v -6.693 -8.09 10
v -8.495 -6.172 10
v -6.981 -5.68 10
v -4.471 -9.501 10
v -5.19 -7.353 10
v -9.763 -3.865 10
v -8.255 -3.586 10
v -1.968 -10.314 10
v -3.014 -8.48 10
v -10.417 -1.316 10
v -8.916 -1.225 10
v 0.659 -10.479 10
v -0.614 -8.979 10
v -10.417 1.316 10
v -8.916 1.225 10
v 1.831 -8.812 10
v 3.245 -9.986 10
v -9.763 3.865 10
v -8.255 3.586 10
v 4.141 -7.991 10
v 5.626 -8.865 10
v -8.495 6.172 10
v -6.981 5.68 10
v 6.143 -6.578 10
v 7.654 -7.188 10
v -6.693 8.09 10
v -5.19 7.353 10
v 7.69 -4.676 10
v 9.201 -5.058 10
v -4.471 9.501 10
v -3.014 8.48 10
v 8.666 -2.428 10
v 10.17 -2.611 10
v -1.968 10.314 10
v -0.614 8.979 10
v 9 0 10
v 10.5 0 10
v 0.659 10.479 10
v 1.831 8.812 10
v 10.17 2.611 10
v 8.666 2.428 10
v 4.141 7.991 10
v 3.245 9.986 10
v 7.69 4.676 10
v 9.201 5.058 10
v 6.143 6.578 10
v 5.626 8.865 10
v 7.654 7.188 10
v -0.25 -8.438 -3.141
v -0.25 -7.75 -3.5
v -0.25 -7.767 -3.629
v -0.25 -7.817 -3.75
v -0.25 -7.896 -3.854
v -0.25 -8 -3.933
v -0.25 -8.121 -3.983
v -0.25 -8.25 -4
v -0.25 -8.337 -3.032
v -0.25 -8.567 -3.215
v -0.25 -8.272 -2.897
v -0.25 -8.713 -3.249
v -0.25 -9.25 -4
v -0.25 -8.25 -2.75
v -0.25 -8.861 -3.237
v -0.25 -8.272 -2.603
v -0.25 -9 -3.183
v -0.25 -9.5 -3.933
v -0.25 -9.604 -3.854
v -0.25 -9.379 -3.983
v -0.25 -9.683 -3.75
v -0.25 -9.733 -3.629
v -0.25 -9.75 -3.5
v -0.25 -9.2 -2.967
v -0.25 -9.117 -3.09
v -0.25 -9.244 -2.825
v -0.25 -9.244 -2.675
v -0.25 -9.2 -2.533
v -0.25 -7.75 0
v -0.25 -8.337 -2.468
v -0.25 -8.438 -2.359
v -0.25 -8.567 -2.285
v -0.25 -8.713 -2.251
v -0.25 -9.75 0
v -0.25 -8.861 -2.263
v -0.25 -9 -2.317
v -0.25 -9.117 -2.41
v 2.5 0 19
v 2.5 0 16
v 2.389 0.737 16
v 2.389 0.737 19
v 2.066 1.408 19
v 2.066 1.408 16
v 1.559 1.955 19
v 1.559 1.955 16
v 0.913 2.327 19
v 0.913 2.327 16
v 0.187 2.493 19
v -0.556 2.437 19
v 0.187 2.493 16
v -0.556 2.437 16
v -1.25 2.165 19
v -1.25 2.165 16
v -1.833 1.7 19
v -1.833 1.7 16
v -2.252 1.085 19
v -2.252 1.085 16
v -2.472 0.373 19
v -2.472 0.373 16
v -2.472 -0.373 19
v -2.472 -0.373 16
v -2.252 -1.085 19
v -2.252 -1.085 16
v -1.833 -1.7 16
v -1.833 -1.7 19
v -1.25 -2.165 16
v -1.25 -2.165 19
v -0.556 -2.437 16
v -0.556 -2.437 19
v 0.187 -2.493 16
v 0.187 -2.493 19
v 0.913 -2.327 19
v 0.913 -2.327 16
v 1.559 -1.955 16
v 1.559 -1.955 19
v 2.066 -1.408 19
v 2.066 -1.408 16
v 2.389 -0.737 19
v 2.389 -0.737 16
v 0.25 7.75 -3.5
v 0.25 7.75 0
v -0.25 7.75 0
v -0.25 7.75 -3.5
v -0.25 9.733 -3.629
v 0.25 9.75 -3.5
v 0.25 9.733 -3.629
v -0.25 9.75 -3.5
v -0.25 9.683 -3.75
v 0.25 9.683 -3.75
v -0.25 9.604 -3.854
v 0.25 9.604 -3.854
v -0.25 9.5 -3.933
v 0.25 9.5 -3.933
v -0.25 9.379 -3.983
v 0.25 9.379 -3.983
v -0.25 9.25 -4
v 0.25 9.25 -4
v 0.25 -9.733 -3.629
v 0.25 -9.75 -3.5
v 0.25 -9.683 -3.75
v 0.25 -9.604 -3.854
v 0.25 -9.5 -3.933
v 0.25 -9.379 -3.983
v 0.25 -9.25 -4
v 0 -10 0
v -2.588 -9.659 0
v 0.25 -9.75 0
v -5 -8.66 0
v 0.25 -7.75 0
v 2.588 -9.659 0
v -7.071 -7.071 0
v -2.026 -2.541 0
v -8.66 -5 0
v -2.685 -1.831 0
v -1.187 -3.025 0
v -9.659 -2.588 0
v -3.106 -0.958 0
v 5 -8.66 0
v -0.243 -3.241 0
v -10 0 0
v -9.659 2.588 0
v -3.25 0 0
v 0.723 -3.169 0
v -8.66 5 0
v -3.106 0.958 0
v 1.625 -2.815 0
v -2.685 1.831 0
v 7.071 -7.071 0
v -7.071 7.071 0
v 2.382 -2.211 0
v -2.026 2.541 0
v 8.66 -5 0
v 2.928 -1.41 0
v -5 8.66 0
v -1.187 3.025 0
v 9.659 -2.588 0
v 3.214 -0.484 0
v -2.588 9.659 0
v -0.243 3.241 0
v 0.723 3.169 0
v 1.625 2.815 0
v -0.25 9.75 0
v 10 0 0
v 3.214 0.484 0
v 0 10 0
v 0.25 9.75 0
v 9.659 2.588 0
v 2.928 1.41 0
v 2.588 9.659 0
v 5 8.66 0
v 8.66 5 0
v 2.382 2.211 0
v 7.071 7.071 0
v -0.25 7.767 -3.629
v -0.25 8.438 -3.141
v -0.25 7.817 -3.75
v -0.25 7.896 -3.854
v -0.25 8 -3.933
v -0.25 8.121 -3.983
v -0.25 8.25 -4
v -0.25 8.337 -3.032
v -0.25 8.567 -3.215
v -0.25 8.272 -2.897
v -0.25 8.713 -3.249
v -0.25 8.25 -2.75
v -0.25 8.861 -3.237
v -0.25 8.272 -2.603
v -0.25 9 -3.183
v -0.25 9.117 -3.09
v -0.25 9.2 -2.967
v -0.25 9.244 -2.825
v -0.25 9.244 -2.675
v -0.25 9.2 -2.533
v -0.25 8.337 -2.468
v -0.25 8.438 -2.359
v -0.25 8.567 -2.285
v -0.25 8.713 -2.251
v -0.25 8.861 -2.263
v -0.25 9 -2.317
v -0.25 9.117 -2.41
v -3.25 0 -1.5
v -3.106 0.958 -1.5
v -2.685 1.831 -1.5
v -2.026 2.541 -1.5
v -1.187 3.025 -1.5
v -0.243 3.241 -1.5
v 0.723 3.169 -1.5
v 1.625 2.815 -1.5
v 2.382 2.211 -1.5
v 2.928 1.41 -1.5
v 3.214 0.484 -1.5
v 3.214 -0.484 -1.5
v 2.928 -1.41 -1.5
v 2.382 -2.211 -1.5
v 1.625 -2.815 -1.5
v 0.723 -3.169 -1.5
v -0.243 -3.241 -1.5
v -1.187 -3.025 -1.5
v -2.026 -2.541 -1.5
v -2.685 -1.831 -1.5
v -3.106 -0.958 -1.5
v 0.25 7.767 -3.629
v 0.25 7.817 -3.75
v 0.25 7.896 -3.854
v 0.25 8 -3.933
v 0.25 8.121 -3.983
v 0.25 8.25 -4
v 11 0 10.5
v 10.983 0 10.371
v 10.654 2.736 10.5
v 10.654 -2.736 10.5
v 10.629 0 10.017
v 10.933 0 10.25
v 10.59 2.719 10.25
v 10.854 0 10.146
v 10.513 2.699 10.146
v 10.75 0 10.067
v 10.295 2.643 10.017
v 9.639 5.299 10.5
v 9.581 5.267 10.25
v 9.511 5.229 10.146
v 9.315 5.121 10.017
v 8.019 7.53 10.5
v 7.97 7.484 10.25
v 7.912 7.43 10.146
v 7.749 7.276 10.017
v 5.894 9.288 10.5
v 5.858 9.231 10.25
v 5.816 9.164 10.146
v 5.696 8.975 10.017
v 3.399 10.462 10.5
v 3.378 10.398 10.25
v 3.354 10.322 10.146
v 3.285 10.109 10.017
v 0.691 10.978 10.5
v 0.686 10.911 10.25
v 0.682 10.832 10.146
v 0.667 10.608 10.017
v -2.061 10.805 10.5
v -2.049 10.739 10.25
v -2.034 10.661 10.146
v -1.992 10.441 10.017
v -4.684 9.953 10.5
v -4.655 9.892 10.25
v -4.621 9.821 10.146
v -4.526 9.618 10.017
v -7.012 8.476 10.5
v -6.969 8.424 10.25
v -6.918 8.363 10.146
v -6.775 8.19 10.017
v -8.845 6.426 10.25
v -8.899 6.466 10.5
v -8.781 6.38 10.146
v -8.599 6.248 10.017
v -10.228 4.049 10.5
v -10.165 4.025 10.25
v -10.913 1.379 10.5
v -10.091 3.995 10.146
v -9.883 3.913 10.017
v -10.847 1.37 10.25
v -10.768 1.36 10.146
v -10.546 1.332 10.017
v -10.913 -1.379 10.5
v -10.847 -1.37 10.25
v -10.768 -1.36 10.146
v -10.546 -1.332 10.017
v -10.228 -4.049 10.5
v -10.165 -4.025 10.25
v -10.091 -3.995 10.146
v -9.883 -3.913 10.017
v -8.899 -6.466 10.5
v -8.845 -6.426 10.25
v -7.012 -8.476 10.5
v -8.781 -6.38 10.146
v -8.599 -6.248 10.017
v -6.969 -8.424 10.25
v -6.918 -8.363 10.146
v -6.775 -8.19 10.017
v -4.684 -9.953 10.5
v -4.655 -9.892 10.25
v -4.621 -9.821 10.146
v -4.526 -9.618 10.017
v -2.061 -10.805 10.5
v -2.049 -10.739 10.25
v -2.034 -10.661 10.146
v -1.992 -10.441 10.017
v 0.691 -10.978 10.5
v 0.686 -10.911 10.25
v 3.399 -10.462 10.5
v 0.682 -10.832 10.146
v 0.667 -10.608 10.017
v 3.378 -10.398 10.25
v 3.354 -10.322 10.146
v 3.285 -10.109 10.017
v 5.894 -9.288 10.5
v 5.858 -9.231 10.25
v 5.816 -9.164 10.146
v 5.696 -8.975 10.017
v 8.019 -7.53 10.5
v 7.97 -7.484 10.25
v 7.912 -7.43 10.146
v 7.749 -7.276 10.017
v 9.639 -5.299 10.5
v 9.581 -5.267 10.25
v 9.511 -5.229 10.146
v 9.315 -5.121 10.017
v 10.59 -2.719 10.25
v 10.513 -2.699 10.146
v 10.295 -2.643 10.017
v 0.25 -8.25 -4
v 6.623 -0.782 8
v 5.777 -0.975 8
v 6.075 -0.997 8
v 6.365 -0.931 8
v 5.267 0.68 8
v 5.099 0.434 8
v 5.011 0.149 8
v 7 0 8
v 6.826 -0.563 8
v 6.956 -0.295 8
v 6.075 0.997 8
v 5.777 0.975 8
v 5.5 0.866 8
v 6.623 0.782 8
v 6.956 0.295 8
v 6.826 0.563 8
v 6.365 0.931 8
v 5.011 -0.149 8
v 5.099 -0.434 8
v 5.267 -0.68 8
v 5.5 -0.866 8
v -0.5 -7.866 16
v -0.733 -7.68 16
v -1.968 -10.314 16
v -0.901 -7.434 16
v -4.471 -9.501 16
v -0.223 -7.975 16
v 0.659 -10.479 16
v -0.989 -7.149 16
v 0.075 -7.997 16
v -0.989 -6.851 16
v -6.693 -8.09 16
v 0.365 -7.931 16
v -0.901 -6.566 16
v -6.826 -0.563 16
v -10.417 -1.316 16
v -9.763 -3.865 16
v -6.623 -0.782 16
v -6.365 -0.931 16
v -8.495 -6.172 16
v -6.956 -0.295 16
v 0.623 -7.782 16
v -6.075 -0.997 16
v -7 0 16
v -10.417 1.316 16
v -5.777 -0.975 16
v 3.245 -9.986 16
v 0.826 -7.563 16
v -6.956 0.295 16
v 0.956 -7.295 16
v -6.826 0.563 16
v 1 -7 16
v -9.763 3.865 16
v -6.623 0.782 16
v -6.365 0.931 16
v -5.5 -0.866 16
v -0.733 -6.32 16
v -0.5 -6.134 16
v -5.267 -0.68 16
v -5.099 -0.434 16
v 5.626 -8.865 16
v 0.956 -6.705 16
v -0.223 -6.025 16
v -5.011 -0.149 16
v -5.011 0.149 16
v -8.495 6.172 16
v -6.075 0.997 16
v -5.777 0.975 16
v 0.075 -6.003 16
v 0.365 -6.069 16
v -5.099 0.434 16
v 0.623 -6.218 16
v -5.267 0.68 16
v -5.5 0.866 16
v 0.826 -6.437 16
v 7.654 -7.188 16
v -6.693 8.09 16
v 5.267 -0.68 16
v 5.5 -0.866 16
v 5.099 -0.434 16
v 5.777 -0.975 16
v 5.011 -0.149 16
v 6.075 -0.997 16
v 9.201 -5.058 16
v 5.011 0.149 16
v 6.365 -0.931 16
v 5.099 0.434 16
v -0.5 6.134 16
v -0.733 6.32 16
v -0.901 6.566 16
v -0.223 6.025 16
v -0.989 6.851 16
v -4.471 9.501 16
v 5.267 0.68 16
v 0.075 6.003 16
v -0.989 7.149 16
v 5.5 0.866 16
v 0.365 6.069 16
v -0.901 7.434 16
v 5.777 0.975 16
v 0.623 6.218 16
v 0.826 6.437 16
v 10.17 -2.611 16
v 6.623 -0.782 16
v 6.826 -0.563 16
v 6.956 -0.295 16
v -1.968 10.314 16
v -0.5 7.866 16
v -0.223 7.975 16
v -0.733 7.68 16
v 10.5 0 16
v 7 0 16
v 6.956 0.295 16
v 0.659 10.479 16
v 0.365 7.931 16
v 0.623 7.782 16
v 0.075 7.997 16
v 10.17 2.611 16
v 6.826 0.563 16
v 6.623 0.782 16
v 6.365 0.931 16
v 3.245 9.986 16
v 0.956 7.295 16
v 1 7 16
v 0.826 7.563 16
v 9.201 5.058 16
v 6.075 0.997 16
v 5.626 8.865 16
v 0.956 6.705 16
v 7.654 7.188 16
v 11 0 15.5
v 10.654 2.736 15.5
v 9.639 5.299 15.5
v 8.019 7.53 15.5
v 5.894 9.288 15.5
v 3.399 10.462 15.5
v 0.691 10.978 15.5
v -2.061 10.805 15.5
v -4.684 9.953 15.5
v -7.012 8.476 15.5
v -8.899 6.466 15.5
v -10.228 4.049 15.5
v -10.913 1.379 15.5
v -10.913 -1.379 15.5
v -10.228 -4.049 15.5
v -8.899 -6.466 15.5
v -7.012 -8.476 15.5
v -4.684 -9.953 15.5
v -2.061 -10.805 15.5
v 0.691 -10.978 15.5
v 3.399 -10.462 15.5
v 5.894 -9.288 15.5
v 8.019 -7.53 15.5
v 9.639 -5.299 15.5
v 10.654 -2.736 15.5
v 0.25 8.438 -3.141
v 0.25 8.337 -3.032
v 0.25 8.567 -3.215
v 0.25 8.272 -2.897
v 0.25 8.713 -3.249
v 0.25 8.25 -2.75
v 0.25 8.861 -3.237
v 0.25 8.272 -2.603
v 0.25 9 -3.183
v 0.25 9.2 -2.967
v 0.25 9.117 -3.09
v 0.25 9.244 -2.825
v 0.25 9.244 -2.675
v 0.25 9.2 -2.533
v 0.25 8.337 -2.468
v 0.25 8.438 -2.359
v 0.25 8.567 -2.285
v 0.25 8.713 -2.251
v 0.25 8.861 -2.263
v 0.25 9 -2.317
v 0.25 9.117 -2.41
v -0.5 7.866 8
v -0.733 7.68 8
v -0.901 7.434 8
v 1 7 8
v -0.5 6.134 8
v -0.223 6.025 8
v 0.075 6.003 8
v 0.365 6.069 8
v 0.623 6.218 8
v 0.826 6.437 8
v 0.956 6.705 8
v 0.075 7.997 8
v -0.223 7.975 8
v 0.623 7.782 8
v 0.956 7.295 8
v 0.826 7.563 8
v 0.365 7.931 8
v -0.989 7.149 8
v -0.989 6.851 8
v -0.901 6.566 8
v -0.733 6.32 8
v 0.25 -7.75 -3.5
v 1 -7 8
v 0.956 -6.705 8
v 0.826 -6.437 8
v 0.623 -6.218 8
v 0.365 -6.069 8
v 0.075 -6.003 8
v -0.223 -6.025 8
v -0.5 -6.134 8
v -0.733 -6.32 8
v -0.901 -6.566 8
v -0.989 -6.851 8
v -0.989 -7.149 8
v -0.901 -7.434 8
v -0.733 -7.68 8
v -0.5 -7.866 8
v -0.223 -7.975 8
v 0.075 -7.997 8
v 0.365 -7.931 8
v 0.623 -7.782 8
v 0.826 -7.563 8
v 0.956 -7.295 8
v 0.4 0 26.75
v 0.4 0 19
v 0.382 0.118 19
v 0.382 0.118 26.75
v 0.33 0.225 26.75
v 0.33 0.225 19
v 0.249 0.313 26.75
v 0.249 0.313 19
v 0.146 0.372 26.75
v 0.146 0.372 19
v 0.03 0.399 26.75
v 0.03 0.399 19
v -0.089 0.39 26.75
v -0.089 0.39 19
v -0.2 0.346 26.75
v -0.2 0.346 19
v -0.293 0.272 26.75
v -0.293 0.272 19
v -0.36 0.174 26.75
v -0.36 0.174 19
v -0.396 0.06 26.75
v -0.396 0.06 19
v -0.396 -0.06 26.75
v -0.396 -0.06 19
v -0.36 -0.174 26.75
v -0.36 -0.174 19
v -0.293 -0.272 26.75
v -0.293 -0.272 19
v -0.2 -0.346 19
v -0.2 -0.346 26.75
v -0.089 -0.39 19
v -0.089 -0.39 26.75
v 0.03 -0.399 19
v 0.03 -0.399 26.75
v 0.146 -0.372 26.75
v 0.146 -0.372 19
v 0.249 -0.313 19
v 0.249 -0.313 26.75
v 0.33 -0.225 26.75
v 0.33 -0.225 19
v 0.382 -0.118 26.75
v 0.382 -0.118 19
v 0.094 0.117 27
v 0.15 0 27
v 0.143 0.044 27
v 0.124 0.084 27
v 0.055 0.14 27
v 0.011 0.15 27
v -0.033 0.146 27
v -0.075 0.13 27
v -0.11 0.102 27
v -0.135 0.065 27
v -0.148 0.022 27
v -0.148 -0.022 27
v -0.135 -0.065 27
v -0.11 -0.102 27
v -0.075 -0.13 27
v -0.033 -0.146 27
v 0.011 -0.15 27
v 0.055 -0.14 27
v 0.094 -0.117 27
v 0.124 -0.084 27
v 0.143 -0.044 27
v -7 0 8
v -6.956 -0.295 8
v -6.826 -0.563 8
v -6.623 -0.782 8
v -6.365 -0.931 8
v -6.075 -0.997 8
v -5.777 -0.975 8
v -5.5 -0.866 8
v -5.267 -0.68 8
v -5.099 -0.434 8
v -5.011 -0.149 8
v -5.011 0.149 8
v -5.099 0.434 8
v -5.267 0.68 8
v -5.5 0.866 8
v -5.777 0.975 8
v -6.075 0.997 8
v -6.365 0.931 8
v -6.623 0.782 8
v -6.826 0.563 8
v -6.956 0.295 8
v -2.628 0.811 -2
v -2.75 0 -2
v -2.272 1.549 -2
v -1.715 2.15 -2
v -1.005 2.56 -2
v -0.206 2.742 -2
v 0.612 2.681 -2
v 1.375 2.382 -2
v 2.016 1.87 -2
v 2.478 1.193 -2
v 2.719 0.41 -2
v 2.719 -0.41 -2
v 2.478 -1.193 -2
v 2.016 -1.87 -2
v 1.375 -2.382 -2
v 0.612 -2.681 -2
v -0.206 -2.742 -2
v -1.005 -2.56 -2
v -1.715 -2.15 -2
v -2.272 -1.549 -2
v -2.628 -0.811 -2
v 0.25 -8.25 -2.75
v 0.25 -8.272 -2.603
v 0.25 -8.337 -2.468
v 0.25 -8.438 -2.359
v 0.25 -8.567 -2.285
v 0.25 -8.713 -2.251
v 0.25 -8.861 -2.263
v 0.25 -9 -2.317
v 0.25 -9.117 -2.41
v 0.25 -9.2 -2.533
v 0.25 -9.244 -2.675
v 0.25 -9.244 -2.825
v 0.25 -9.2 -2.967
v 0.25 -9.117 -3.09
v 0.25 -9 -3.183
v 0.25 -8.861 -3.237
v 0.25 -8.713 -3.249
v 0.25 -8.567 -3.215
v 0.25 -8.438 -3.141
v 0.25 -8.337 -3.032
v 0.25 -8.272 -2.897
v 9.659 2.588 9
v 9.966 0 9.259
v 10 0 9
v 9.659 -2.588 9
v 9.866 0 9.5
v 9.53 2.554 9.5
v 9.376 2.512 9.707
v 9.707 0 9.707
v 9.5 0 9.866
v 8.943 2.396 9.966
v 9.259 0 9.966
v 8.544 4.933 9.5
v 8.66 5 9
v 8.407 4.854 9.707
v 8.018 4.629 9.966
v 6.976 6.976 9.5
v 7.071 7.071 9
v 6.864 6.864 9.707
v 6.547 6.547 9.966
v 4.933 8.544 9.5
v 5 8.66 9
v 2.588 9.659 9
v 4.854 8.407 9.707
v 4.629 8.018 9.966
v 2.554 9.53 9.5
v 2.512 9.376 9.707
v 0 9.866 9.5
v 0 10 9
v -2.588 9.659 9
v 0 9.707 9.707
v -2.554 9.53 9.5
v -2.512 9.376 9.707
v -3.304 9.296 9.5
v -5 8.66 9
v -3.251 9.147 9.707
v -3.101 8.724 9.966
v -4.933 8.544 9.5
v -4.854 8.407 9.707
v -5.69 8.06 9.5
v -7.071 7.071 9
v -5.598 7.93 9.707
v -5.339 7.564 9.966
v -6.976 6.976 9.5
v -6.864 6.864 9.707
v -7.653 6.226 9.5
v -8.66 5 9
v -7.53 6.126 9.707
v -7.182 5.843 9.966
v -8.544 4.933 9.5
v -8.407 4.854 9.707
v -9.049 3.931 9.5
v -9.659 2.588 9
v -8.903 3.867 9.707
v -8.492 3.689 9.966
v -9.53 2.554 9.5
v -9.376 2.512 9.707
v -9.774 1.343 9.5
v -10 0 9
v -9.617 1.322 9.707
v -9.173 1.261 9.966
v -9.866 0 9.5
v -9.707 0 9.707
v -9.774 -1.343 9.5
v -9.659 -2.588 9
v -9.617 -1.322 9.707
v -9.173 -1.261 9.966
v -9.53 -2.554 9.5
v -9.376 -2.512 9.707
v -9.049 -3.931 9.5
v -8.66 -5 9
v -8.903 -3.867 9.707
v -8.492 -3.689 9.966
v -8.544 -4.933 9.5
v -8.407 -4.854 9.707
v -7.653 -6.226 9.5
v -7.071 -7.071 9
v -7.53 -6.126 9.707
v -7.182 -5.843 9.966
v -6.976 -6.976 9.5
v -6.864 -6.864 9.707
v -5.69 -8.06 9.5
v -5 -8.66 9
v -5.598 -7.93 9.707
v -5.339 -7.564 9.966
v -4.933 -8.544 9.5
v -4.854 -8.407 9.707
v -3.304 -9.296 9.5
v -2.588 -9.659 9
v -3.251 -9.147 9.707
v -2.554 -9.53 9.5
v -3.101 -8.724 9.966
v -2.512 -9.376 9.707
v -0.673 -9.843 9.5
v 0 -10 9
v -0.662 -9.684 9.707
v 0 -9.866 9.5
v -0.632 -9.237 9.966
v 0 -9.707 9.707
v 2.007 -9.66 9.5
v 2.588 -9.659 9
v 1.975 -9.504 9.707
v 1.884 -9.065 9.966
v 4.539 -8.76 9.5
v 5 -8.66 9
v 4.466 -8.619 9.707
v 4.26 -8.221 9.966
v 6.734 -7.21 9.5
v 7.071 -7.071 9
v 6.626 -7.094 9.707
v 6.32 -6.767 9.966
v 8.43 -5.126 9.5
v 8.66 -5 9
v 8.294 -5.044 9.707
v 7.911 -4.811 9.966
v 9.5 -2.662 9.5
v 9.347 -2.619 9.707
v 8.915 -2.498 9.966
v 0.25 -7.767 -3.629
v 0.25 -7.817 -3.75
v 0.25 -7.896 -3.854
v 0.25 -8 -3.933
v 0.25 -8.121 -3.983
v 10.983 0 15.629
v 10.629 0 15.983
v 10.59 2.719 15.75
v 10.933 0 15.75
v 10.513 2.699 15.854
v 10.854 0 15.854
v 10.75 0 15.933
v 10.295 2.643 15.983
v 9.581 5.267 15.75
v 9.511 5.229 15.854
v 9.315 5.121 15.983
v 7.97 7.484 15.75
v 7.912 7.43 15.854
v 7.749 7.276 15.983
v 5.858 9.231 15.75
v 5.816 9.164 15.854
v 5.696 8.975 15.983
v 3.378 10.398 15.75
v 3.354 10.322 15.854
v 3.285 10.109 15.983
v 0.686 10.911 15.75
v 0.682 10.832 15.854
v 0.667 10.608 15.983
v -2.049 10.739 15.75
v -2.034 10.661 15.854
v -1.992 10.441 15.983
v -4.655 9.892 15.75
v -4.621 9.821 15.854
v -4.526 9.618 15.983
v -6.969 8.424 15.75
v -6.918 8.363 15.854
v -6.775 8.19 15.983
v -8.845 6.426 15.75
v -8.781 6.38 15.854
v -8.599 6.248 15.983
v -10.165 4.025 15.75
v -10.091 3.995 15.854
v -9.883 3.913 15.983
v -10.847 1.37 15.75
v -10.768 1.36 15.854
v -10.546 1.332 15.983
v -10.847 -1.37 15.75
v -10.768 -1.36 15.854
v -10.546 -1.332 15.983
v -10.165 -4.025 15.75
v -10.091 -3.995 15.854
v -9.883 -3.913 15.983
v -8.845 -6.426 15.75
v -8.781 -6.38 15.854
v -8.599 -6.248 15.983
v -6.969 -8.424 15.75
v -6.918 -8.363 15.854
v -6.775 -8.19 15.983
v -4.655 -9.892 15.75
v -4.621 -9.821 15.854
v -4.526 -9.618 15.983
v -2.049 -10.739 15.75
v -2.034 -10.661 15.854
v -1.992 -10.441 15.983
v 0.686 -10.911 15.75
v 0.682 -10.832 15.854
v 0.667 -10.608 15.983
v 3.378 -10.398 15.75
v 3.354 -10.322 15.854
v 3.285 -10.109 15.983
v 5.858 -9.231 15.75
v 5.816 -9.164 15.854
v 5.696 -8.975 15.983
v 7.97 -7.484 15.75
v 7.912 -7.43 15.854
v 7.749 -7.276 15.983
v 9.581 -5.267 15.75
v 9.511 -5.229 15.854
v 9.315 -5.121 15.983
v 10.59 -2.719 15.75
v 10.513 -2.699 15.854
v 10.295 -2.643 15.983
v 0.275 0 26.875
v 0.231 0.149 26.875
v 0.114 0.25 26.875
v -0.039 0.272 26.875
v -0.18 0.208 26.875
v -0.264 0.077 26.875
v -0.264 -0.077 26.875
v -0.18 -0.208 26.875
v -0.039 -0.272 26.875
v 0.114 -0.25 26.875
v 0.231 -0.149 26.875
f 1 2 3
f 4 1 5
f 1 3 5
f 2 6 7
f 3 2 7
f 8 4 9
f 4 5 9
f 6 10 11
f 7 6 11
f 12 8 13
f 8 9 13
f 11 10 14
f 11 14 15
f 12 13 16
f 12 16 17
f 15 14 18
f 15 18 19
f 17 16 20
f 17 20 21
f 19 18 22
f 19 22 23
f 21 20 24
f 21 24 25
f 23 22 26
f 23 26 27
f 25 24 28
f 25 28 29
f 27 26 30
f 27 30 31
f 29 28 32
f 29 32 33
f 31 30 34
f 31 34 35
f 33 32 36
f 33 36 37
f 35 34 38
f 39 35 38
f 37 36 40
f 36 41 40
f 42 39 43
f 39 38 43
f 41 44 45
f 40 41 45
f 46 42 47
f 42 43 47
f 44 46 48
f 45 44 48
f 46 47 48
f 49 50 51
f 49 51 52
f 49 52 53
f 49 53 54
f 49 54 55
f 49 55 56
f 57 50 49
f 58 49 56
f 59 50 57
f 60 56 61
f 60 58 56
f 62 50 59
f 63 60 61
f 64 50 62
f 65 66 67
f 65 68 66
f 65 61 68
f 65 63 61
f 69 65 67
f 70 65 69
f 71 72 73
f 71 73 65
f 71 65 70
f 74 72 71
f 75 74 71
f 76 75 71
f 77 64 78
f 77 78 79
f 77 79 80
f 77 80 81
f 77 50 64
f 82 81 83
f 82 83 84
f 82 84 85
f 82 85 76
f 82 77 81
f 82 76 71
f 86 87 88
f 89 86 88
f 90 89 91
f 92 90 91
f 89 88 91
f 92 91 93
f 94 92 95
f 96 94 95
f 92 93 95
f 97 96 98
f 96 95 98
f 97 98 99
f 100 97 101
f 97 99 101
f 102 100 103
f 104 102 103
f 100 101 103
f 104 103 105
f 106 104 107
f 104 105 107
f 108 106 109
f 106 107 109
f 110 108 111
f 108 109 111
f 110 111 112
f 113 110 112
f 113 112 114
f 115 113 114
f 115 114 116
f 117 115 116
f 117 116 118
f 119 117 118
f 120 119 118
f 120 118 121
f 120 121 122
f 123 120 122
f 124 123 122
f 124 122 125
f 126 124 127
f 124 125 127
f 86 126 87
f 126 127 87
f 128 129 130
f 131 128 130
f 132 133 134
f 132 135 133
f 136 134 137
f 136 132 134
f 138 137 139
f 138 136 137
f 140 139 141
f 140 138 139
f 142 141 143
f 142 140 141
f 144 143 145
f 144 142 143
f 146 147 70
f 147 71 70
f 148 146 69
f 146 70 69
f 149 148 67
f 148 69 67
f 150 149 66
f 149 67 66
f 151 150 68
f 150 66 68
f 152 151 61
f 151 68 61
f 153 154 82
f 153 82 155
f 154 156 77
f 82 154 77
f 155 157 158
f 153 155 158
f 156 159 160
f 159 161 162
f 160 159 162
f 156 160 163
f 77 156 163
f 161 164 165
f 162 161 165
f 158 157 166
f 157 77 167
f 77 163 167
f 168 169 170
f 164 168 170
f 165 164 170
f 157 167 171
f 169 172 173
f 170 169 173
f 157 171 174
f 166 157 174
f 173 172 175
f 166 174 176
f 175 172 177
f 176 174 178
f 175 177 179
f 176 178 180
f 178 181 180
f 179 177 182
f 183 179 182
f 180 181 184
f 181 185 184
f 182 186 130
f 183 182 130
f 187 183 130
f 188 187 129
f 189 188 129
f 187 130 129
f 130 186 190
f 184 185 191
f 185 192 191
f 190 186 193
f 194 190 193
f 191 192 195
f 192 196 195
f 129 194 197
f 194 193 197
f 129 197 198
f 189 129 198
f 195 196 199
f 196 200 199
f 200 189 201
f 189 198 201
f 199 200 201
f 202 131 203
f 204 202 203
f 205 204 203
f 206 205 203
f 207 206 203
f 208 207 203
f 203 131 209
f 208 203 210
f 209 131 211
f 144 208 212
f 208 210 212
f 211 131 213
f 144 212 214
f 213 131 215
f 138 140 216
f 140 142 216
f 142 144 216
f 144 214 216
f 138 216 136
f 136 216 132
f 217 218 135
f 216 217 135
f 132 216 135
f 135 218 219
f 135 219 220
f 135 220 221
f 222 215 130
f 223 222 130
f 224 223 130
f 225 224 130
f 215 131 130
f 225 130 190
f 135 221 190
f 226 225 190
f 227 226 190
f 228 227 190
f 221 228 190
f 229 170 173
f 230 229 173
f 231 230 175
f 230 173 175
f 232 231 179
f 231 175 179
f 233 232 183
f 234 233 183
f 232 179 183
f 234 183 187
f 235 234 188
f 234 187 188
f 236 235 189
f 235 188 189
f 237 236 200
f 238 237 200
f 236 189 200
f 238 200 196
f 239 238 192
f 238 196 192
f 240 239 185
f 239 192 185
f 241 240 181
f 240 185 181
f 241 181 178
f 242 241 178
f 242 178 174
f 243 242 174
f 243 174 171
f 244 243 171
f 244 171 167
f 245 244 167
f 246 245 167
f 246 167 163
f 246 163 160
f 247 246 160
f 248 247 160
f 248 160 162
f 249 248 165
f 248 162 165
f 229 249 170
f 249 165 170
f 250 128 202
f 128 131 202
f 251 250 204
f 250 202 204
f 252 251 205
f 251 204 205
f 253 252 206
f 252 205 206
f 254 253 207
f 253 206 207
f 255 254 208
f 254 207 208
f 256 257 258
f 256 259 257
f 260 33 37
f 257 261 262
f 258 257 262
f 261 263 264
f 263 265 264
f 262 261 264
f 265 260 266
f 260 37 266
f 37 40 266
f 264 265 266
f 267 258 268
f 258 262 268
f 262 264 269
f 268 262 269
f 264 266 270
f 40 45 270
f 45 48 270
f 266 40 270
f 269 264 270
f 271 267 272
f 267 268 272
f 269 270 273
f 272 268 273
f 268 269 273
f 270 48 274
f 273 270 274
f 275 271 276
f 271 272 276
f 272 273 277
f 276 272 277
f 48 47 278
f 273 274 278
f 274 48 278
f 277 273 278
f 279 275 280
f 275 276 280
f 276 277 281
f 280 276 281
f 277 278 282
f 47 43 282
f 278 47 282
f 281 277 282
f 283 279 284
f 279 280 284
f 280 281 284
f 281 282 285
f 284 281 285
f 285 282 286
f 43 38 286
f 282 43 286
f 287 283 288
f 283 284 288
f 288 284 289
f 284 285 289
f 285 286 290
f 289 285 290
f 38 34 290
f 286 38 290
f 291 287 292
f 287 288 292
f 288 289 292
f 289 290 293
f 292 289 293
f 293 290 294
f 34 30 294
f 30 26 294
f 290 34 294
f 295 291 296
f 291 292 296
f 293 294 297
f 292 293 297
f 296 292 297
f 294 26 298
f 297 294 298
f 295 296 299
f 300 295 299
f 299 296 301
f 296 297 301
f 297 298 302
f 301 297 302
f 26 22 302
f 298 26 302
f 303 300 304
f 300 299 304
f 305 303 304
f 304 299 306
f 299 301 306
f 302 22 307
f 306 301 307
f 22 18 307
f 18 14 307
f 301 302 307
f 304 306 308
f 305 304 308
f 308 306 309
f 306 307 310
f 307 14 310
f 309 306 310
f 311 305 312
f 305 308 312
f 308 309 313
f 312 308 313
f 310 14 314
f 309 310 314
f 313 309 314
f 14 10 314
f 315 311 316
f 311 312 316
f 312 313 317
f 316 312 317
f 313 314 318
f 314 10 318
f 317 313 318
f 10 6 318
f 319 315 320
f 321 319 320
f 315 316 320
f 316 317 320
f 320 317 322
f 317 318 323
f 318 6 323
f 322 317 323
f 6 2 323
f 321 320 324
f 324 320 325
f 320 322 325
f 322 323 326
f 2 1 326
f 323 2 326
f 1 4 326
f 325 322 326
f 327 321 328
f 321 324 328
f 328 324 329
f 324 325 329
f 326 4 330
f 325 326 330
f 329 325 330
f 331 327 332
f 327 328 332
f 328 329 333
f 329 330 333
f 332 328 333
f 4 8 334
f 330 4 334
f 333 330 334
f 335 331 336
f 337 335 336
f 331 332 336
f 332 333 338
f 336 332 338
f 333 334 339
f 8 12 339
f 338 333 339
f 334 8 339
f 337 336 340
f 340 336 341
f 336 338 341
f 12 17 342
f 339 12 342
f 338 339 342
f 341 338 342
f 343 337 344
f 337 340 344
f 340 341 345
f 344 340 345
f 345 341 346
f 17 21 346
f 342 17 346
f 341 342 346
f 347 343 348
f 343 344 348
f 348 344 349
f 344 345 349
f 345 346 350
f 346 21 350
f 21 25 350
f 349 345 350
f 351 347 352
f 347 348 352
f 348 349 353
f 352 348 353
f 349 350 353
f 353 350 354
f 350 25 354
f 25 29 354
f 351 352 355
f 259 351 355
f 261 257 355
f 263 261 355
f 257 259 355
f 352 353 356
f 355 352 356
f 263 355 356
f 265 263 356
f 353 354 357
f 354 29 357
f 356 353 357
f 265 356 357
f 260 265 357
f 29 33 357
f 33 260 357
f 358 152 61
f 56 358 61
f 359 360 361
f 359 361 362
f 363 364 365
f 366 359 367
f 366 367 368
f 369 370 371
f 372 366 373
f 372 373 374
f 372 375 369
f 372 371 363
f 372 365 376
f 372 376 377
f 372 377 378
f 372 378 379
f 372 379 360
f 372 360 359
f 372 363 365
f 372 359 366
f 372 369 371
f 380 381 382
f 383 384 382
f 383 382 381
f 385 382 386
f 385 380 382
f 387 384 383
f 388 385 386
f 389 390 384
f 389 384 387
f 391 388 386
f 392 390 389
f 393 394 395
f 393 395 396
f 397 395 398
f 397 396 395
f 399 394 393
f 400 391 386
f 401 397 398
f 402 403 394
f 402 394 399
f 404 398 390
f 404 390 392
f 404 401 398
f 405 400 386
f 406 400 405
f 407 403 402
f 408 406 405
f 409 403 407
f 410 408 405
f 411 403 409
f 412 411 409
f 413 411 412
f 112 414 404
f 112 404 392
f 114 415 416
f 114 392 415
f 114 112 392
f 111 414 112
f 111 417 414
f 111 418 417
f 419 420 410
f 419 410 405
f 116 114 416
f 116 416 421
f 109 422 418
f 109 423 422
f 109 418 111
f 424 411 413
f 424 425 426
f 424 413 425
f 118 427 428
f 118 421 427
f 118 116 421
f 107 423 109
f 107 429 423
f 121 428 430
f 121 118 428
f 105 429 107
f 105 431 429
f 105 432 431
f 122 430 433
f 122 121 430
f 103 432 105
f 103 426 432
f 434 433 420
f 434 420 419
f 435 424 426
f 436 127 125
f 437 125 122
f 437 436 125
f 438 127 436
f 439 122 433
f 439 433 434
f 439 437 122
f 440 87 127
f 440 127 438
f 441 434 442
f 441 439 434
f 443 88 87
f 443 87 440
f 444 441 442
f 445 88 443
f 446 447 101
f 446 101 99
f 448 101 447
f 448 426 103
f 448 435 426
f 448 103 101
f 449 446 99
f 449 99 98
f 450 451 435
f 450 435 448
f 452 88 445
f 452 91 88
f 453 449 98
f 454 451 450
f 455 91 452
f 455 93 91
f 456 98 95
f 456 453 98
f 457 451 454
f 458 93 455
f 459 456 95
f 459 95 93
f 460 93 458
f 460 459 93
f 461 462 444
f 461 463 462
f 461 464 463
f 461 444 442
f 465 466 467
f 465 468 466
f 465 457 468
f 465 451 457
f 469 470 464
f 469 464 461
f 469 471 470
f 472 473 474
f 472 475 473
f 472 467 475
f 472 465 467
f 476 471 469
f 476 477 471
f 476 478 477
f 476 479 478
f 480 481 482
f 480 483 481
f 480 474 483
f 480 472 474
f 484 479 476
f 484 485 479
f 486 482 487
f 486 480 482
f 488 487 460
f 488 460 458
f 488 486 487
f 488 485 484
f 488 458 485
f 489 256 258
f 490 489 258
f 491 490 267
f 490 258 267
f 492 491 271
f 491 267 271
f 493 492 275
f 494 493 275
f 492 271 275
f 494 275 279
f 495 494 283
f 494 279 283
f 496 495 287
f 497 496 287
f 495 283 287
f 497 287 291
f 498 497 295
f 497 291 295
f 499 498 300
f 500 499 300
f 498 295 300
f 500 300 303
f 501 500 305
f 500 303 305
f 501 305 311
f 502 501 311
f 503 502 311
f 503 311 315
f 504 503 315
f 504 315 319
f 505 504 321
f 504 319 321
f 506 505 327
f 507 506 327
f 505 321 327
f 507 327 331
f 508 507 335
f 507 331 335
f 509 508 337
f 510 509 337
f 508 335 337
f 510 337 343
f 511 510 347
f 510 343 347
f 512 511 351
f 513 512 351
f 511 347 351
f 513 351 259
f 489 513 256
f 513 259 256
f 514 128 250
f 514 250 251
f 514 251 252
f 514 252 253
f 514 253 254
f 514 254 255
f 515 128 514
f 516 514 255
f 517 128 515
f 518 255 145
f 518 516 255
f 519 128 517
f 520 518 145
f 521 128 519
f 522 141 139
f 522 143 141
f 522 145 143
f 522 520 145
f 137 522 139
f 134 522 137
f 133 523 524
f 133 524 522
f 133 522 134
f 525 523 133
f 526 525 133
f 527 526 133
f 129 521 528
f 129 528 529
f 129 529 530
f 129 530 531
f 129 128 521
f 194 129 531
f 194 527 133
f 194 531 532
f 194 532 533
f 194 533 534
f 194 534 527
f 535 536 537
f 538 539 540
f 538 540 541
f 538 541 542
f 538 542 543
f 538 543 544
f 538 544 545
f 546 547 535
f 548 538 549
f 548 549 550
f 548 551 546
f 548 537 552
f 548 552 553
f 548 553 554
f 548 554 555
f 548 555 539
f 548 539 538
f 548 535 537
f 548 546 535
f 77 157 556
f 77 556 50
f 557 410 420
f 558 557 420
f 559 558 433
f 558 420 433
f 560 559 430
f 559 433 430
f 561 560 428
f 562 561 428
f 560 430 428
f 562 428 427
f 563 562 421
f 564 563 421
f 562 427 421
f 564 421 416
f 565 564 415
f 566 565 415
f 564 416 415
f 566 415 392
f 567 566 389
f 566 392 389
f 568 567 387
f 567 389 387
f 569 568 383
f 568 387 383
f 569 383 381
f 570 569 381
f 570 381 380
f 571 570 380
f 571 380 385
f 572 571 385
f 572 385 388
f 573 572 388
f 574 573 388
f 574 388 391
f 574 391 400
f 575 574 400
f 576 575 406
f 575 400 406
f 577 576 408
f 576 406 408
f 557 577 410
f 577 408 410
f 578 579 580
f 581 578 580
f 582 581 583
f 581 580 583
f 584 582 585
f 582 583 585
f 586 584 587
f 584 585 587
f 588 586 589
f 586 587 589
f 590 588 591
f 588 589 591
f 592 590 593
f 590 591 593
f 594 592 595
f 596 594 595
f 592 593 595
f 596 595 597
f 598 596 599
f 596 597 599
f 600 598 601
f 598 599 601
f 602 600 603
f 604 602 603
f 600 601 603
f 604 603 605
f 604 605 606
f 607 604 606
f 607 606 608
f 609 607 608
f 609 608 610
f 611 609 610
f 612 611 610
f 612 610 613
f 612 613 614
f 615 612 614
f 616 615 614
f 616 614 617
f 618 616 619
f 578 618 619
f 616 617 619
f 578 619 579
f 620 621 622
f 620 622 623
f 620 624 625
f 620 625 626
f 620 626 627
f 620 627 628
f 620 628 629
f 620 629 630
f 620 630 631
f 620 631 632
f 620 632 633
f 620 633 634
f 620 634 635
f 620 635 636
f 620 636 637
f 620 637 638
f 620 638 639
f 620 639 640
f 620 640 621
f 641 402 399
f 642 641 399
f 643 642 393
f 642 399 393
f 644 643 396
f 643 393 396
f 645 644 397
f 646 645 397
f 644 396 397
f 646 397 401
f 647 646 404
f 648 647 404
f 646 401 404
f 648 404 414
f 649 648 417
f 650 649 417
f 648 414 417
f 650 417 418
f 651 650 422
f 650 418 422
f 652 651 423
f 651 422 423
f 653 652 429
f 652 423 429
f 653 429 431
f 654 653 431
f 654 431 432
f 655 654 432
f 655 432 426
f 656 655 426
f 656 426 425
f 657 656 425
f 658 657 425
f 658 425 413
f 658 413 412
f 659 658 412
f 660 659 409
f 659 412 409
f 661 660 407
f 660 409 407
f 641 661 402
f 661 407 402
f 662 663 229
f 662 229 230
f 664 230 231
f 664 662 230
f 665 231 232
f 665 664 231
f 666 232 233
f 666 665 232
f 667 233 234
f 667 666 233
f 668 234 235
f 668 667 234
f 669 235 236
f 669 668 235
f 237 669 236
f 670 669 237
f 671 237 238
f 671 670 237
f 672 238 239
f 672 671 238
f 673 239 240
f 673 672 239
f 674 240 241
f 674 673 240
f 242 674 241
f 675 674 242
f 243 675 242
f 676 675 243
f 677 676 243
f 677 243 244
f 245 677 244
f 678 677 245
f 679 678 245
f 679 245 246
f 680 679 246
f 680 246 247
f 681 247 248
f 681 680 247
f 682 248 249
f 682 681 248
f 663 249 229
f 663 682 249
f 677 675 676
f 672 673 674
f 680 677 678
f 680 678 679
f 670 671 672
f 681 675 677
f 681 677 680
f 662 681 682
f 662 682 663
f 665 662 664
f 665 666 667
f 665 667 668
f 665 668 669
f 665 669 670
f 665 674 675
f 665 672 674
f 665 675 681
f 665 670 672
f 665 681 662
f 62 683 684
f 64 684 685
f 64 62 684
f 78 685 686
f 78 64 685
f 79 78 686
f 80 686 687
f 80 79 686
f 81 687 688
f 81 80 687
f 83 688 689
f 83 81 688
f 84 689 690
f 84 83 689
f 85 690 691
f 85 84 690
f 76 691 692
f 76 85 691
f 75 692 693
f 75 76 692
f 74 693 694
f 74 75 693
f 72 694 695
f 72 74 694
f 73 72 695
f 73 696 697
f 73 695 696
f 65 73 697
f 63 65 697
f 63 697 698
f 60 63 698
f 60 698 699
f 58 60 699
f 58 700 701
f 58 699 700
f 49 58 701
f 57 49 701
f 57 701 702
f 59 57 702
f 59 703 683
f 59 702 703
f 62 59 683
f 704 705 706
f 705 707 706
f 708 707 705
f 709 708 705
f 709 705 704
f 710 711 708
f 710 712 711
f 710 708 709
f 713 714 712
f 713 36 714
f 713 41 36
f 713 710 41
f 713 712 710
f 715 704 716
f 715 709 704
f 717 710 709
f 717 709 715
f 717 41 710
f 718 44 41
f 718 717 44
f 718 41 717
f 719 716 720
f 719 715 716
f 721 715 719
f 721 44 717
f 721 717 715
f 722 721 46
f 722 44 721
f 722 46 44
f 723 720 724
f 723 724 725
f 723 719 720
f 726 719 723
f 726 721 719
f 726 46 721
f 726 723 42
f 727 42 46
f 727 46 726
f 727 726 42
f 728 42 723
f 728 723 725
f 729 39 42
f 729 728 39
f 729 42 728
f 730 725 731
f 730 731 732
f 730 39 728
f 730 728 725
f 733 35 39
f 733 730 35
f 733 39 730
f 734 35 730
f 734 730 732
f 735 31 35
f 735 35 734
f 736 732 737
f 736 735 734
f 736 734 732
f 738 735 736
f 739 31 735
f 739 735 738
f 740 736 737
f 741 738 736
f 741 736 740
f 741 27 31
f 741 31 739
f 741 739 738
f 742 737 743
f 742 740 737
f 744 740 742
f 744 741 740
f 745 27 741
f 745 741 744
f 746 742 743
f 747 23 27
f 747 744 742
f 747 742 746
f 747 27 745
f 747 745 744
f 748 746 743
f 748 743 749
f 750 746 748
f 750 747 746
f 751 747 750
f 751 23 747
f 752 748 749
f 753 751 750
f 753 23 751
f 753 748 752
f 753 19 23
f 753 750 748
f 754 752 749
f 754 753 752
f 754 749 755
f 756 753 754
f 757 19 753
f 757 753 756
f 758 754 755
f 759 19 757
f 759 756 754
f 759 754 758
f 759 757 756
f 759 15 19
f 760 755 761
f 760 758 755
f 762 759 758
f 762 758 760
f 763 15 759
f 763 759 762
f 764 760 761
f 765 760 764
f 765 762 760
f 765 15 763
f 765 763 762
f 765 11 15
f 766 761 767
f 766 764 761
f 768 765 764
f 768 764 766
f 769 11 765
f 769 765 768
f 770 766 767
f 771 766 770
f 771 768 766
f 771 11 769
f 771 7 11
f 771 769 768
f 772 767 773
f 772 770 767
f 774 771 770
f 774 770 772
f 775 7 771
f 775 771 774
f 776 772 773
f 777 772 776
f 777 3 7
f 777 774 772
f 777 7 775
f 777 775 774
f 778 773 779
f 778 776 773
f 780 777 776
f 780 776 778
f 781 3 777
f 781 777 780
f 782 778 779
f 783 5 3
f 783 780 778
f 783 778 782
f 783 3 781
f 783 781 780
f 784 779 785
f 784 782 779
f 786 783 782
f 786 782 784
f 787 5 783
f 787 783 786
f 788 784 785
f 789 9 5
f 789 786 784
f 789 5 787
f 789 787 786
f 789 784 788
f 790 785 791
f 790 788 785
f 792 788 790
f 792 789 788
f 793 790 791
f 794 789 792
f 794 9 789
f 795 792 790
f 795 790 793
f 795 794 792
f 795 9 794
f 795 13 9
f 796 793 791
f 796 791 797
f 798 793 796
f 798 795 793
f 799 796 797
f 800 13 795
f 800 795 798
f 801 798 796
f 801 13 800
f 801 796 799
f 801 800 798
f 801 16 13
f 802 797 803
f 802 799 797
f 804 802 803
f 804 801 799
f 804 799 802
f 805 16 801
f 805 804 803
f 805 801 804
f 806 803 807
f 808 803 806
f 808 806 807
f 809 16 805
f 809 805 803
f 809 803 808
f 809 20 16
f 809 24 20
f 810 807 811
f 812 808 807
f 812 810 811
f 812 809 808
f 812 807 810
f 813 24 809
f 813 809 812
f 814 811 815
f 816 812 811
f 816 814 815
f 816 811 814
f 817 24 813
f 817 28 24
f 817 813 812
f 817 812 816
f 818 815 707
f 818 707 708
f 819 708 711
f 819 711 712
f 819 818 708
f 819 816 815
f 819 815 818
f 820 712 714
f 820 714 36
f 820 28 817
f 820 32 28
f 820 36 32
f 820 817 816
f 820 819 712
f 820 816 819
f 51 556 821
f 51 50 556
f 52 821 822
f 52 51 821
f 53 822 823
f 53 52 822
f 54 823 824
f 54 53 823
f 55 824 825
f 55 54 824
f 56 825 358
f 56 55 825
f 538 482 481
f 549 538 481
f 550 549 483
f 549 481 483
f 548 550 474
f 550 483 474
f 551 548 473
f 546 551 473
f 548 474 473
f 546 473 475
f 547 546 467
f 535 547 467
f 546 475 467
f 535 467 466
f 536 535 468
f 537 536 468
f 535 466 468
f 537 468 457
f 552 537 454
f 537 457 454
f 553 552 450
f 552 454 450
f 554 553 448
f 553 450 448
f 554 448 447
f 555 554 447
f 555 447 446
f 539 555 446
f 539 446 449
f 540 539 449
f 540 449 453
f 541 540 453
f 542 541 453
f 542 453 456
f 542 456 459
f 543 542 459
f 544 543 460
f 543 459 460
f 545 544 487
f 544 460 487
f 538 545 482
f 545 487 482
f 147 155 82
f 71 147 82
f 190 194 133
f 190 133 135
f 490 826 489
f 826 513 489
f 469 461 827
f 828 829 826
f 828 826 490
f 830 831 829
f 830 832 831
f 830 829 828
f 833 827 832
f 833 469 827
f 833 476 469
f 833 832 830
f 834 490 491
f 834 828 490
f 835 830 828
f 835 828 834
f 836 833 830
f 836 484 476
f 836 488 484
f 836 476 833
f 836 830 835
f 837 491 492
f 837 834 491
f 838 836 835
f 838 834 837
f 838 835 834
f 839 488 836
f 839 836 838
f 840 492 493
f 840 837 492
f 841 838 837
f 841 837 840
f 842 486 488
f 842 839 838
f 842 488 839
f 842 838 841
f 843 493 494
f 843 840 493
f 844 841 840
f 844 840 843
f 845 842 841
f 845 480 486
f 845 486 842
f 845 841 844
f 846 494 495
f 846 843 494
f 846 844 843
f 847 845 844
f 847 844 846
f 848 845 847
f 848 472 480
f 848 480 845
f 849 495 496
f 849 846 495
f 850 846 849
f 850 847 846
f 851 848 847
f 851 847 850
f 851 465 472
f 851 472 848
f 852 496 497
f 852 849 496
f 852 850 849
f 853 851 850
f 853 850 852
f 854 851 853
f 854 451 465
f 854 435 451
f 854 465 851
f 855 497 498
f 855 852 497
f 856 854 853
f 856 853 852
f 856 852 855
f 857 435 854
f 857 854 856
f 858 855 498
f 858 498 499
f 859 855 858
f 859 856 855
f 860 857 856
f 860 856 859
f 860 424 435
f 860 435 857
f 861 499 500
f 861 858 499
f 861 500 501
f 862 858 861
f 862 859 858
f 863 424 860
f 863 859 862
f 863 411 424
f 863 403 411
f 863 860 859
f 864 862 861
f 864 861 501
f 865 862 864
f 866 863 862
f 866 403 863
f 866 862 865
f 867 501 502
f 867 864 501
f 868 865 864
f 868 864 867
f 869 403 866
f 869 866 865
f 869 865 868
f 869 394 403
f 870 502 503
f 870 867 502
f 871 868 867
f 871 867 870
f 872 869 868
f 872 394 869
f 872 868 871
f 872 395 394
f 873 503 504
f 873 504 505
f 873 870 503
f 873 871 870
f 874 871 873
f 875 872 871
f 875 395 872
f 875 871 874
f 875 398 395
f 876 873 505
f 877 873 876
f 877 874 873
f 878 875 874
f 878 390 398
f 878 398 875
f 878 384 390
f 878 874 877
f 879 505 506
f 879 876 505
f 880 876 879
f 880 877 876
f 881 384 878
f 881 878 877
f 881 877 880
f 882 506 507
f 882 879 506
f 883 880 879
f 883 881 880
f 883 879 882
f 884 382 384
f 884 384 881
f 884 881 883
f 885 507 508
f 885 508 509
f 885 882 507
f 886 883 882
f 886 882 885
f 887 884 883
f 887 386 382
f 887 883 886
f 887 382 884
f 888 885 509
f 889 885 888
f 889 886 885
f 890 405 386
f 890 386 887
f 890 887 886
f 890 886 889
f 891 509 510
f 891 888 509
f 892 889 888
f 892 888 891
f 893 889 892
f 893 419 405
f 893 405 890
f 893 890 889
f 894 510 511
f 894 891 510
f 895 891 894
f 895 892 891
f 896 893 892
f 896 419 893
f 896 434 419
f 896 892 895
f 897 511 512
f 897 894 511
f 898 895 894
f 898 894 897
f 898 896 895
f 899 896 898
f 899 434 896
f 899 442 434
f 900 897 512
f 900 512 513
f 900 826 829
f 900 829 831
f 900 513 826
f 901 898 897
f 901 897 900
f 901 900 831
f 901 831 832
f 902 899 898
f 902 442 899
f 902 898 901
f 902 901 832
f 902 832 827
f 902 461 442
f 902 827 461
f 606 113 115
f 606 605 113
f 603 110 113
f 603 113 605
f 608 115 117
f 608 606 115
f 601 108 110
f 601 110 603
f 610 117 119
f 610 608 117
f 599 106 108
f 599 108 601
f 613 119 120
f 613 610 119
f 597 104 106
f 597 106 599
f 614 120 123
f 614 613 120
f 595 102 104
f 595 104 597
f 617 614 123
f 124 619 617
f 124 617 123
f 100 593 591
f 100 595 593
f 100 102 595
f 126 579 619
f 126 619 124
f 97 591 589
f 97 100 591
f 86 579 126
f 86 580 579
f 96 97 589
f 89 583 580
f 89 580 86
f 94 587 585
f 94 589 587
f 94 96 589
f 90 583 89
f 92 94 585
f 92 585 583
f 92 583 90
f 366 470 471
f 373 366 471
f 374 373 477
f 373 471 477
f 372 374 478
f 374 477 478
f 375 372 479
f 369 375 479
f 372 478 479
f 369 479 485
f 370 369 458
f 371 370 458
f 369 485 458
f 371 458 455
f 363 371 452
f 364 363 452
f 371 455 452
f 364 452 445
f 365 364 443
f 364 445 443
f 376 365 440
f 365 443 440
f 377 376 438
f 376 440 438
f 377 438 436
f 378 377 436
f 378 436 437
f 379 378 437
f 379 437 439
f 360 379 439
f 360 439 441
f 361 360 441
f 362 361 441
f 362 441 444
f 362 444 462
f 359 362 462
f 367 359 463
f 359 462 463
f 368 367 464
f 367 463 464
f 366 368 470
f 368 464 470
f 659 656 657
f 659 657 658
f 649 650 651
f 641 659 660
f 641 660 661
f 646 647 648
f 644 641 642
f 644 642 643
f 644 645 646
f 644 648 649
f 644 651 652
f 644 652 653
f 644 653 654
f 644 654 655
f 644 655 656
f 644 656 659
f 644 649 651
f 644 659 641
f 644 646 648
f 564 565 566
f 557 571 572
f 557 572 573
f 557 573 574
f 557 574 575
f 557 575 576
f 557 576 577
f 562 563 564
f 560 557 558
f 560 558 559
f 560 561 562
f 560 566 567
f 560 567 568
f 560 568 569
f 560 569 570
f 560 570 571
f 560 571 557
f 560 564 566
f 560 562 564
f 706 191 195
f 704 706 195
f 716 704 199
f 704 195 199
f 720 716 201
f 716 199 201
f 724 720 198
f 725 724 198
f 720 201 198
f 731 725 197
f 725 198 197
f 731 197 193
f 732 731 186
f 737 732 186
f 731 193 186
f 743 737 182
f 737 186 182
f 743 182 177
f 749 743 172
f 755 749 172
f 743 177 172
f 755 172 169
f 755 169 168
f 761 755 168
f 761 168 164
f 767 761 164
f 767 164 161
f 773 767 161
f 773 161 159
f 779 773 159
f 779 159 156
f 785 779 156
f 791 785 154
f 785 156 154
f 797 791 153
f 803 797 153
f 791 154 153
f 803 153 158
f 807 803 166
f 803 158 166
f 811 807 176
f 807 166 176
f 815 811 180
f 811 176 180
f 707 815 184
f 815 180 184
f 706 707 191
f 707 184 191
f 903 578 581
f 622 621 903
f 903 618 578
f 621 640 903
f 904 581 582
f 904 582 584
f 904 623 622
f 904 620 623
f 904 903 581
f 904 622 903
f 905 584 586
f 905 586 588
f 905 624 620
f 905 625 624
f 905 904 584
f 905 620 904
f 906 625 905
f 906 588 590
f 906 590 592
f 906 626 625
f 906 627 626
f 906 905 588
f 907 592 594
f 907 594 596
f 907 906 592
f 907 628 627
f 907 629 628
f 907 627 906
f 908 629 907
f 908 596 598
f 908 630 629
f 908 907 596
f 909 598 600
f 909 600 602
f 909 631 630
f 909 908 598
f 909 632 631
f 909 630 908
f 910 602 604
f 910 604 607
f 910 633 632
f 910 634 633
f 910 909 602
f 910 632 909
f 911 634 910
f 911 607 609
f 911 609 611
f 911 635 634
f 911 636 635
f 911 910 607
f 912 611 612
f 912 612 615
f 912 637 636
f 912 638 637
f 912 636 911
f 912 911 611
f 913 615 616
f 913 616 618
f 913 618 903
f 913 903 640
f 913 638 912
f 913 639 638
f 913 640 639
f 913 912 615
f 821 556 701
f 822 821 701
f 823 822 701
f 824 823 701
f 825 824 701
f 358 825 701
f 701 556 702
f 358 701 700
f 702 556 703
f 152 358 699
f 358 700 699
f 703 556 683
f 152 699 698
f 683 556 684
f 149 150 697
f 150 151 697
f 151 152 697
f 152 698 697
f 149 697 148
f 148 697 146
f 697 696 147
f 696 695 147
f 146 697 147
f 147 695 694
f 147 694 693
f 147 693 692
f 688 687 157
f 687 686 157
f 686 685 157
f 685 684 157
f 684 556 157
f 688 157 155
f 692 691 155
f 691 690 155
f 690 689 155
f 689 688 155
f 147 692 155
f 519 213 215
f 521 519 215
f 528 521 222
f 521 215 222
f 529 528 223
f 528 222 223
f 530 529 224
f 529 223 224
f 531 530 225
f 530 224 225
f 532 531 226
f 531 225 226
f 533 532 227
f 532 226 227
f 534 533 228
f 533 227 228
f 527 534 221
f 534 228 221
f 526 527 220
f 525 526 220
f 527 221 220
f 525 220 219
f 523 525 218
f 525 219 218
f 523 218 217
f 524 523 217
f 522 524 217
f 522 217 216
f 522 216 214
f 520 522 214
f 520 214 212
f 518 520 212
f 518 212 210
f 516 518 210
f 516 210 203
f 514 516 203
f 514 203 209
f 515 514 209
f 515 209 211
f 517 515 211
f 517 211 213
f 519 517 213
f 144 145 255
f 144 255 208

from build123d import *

# Parameters (mm, degrees)
SKETCH1_R            = 10
BOSS_EXTRUDE1_DEPTH  = 10
FILLET1_R            = 1
SKETCH2_R            = 3.25
BOSS_EXTRUDE2_DEPTH  = 2
SKETCH3_W            = 0.5
SKETCH3_H            = 2
BOSS_EXTRUDE4_DEPTH  = 4
SKETCH5_R            = 0.5
CUT_EXTRUDE2_DEPTH   = 4
FILLET3_R            = 0.5
FILLET3_OF_MIRROR2_R = 0.5
SKETCH6_R            = 11
BOSS_EXTRUDE5_DEPTH  = 6
FILLET4_R            = 0.5
SKETCH7_R            = 2.5
BOSS_EXTRUDE6_DEPTH  = 3
SKETCH8_R            = 0.4
BOSS_EXTRUDE7_DEPTH  = 8
CHAMFER1_SIZE        = 0.5
CHAMFER2_SIZE        = 0.25
SKETCH16_R           = 1
CUT_EXTRUDE3_DEPTH   = 8


with BuildPart() as part:
    # Sketch1 → Boss-Extrude1 (new body)
    with BuildSketch(Plane.XY):
        Circle(SKETCH1_R)
    extrude(amount=BOSS_EXTRUDE1_DEPTH)

    # Fillet1
    fillet1_edges = [part.edges().sort_by_distance(p)[0] for p in [
        (-10, 0, 10),
    ]]
    fillet(fillet1_edges, radius=FILLET1_R)

    # Sketch2 → Boss-Extrude2 (add)
    with BuildSketch(Plane(origin=(0, 0, 0), x_dir=(-1, 0, 0), z_dir=(0, 0, -1))):
        Circle(SKETCH2_R)
    extrude(amount=BOSS_EXTRUDE2_DEPTH)

    # Sketch3 → Boss-Extrude4 (add)
    with BuildSketch(Plane(origin=(0, 0, 0), x_dir=(-1, 0, 0), z_dir=(0, 0, -1))):
        with Locations((0, 8.75)):
            Rectangle(SKETCH3_W, SKETCH3_H)
    boss_extrude4 = extrude(amount=BOSS_EXTRUDE4_DEPTH)

    # Sketch5 → Cut-Extrude2 (cut)
    with BuildSketch(Plane.ZY.offset(0.25)):
        with Locations((-2.75, 8.75)):
            Circle(SKETCH5_R)
    cut_extrude2 = extrude(amount=-CUT_EXTRUDE2_DEPTH, mode=Mode.SUBTRACT)

    # Fillet3
    fillet3_edges = [part.edges().sort_by_distance(p)[0] for p in [
        (0, 7.75, -4),
        (0, 9.75, -4),
    ]]
    fillet(fillet3_edges, radius=FILLET3_R)

    # Mirror2: Boss-Extrude4, Cut-Extrude2 across plane
    add(boss_extrude4.mirror(Plane.ZX))
    add(cut_extrude2.mirror(Plane.ZX), mode=Mode.SUBTRACT)

    # Fillet3 of Mirror2
    fillet3_of_mirror2_edges = [part.edges().sort_by_distance(p)[0] for p in [
        (0, -7.75, -4),
        (0, -9.75, -4),
    ]]
    fillet(fillet3_of_mirror2_edges, radius=FILLET3_OF_MIRROR2_R)

    # Sketch6 → Boss-Extrude5 (add)
    with BuildSketch(Plane.XY.offset(10)):
        Circle(SKETCH6_R)
    extrude(amount=BOSS_EXTRUDE5_DEPTH)

    # Fillet4
    fillet4_edges = [part.edges().sort_by_distance(p)[0] for p in [
        (-11, 0, 16),
        (-11, 0, 10),
    ]]
    fillet(fillet4_edges, radius=FILLET4_R)

    # Sketch7 → Boss-Extrude6 (add)
    with BuildSketch(Plane.XY.offset(16)):
        Circle(SKETCH7_R)
    extrude(amount=BOSS_EXTRUDE6_DEPTH)

    # Sketch8 → Boss-Extrude7 (add)
    with BuildSketch(Plane.XY.offset(19)):
        Circle(SKETCH8_R)
    extrude(amount=BOSS_EXTRUDE7_DEPTH)

    # Chamfer1
    chamfer1_edges = [part.edges().sort_by_distance(p)[0] for p in [
        (3.25, 0, -2),
    ]]
    chamfer(chamfer1_edges, length=CHAMFER1_SIZE)

    # Chamfer2
    chamfer2_edges = [part.edges().sort_by_distance(p)[0] for p in [
        (-0.4, 0, 27),
    ]]
    chamfer(chamfer2_edges, length=CHAMFER2_SIZE)

    # Sketch16 → Cut-Extrude3 (cut)
    with BuildSketch(Plane.XY.offset(16)):
        with Locations((0, 7)):
            Circle(SKETCH16_R)
        with Locations((0, -7)):
            Circle(SKETCH16_R)
        with Locations((6, 0)):
            Circle(SKETCH16_R)
        with Locations((-6, 0)):
            Circle(SKETCH16_R)
    extrude(amount=-CUT_EXTRUDE3_DEPTH, mode=Mode.SUBTRACT)


solid = part.part
